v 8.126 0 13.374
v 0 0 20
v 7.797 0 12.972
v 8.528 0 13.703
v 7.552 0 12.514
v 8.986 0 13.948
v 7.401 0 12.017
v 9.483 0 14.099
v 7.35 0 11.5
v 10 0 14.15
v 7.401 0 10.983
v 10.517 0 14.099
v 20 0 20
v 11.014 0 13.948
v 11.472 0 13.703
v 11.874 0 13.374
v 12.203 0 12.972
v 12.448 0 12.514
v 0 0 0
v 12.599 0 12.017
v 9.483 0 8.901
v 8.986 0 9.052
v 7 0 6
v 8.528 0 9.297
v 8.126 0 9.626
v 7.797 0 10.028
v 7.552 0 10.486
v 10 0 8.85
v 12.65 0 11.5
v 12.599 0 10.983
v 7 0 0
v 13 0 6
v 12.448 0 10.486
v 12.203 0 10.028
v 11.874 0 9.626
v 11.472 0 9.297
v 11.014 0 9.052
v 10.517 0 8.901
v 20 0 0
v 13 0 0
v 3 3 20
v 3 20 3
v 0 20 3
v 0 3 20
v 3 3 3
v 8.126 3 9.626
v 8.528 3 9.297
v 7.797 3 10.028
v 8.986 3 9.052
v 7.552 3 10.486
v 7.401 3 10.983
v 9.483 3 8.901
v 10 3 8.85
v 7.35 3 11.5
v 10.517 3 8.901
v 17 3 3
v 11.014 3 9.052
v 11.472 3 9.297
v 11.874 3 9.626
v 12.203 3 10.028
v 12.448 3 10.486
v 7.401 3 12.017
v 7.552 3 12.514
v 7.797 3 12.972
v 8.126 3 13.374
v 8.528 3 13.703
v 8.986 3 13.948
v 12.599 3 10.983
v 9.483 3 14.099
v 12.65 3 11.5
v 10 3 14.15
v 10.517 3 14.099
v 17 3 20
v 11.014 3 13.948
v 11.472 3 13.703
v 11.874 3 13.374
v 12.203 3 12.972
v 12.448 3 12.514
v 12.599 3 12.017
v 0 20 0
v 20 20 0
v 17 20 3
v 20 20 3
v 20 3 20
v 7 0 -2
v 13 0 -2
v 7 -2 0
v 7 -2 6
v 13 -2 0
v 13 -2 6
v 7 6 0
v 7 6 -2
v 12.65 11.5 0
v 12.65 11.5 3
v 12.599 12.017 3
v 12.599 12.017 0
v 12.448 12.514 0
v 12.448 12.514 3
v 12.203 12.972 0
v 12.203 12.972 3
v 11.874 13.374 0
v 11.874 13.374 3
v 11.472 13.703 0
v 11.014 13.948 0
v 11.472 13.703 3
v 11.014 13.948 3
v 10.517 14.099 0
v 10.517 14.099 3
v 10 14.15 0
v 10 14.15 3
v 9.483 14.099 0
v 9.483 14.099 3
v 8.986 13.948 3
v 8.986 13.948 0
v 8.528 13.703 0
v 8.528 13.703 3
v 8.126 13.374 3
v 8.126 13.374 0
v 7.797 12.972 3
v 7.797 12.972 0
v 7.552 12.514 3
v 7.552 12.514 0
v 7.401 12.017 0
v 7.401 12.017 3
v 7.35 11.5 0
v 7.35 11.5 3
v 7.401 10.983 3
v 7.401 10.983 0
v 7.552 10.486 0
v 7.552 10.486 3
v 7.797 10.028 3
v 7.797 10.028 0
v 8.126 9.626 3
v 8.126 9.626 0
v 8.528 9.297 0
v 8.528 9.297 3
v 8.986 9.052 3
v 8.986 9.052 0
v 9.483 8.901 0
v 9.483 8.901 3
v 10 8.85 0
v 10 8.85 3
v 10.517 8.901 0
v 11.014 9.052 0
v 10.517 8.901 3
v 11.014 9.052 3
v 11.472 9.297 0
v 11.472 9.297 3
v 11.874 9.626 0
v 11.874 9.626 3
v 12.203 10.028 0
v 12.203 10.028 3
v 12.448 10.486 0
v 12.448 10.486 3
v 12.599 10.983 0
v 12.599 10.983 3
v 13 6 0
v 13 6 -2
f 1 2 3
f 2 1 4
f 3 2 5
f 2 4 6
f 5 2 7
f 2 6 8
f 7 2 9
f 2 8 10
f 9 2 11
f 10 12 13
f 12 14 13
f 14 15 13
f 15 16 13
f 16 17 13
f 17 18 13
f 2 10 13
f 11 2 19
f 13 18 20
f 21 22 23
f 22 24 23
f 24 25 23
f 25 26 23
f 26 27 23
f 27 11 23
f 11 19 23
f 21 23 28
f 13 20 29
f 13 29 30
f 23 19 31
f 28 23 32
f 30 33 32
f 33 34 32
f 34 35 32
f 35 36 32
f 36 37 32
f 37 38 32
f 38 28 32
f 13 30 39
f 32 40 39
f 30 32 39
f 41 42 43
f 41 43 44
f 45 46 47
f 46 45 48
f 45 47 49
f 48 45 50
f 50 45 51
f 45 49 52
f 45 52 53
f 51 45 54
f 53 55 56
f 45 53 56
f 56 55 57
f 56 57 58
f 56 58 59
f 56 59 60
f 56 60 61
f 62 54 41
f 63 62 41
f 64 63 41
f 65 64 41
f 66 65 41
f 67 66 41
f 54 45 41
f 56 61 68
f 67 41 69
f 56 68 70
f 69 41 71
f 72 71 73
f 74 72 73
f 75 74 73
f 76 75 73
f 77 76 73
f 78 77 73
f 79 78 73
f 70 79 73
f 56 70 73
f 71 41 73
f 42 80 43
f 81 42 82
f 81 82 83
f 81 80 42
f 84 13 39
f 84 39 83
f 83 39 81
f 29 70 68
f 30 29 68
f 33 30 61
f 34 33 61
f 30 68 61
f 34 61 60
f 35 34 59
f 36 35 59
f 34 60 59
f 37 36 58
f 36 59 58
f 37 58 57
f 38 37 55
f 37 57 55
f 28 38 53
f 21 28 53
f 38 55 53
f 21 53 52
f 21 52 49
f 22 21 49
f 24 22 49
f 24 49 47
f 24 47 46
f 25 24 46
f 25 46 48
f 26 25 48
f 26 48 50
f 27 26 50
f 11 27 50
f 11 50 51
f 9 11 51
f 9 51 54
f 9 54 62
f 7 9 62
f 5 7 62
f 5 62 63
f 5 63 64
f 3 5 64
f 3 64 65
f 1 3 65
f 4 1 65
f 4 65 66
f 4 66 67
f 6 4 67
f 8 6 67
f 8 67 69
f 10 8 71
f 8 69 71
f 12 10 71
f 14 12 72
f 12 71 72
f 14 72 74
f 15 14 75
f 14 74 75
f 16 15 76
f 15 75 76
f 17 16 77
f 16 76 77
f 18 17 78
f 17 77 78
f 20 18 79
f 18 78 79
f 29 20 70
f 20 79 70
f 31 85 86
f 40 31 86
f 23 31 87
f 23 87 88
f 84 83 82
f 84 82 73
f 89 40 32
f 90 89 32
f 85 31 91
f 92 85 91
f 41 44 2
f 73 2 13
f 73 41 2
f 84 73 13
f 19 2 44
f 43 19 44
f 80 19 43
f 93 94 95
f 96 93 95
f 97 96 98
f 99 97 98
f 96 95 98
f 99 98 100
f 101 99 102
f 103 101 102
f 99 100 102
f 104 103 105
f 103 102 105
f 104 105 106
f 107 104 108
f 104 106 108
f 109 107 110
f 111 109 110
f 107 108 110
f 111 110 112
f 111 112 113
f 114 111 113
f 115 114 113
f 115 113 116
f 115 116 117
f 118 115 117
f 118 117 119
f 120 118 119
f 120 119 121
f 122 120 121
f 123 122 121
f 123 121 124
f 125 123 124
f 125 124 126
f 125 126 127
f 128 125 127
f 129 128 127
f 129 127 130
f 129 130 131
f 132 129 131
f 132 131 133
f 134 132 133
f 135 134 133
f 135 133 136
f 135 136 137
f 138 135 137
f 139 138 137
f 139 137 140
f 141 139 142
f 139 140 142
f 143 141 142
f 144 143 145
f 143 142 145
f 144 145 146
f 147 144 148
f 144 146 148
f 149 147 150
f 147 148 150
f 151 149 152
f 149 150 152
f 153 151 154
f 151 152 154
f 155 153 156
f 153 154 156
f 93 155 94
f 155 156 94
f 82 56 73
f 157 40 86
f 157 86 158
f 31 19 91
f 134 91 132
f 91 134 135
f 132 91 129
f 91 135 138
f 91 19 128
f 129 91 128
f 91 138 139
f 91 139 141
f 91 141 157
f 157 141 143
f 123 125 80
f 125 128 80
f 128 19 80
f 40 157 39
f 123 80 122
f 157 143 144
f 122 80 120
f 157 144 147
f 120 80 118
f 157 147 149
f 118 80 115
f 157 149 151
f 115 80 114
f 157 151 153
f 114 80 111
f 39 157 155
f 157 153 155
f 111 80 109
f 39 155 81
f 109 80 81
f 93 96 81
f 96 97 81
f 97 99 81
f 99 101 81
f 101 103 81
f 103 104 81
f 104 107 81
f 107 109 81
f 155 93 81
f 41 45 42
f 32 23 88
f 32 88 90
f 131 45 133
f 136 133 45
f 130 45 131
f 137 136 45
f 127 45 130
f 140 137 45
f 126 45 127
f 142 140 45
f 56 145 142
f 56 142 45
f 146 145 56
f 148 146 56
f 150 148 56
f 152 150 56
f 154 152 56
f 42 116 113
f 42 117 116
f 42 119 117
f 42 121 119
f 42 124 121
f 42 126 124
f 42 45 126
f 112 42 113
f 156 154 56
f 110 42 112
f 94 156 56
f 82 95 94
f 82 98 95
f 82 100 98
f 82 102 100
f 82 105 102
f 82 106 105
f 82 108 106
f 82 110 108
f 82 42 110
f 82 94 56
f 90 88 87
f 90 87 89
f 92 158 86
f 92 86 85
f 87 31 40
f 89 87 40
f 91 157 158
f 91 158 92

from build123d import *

# Parameters (mm, degrees)
ESBO_O1_W                = 20
ESBO_O1_H                = 20
RESSALTO_EXTRUS_O1_DEPTH = 20
CORTE_EXTRUS_O1_DEPTH    = 21
ESBO_O3_W                = 14
ESBO_O3_H                = 17
CORTE_EXTRUS_O2_DEPTH    = 17
ESBO_O4_W                = 6
ESBO_O4_H                = 6
RESSALTO_EXTRUS_O2_DEPTH = 2
ESBO_O5_W                = 6
ESBO_O5_H                = 6
RESSALTO_EXTRUS_O3_DEPTH = 2
ESBO_O6_R                = 2.65
CORTE_EXTRUS_O3_DEPTH    = 6
ESBO_O7_R                = 2.65
CORTE_EXTRUS_O4_DEPTH    = 6


with BuildPart() as part:
    # Esboço1 → Ressalto-extrusão1 (new body)
    with BuildSketch(Plane.XY):
        with Locations((10, 10)):
            Rectangle(ESBO_O1_W, ESBO_O1_H)
    extrude(amount=RESSALTO_EXTRUS_O1_DEPTH)

    # Esboço2 → Corte-extrusão1 (cut, through all)
    with BuildSketch(Plane(origin=(20, 0, 0), x_dir=(0, 0, -1), z_dir=(1, 0, 0))):
        Polygon((-3, 20), (-20, 3), (-20, 20), align=None)
    extrude(amount=-CORTE_EXTRUS_O1_DEPTH, mode=Mode.SUBTRACT)

    # Esboço3 → Corte-extrusão2 (cut)
    with BuildSketch(Plane.XY.offset(20)):
        with Locations((10, 11.5)):
            Rectangle(ESBO_O3_W, ESBO_O3_H)
    extrude(amount=-CORTE_EXTRUS_O2_DEPTH, mode=Mode.SUBTRACT)

    # Esboço4 → Ressalto-extrusão2 (add)
    with BuildSketch(Plane(origin=(0, 0, 0), x_dir=(-1, 0, 0), z_dir=(0, 0, -1))):
        with Locations((-10, 3)):
            Rectangle(ESBO_O4_W, ESBO_O4_H)
    extrude(amount=RESSALTO_EXTRUS_O2_DEPTH)

    # Esboço5 → Ressalto-extrusão3 (add)
    with BuildSketch(Plane.XZ):
        with Locations((10, 3)):
            Rectangle(ESBO_O5_W, ESBO_O5_H)
    extrude(amount=RESSALTO_EXTRUS_O3_DEPTH)

    # Esboço6 → Corte-extrusão3 (cut, through all)
    with BuildSketch(Plane.XY.offset(3)):
        with Locations((10, 11.5)):
            Circle(ESBO_O6_R)
    extrude(amount=-CORTE_EXTRUS_O3_DEPTH, mode=Mode.SUBTRACT)

    # Esboço7 → Corte-extrusão4 (cut, through all)
    with BuildSketch(Plane(origin=(0, 3, 0), x_dir=(1, 0, 0), z_dir=(0, 1, 0))):
        with Locations((10, -11.5)):
            Circle(ESBO_O7_R)
    extrude(amount=-CORTE_EXTRUS_O4_DEPTH, mode=Mode.SUBTRACT)


solid = part.part
